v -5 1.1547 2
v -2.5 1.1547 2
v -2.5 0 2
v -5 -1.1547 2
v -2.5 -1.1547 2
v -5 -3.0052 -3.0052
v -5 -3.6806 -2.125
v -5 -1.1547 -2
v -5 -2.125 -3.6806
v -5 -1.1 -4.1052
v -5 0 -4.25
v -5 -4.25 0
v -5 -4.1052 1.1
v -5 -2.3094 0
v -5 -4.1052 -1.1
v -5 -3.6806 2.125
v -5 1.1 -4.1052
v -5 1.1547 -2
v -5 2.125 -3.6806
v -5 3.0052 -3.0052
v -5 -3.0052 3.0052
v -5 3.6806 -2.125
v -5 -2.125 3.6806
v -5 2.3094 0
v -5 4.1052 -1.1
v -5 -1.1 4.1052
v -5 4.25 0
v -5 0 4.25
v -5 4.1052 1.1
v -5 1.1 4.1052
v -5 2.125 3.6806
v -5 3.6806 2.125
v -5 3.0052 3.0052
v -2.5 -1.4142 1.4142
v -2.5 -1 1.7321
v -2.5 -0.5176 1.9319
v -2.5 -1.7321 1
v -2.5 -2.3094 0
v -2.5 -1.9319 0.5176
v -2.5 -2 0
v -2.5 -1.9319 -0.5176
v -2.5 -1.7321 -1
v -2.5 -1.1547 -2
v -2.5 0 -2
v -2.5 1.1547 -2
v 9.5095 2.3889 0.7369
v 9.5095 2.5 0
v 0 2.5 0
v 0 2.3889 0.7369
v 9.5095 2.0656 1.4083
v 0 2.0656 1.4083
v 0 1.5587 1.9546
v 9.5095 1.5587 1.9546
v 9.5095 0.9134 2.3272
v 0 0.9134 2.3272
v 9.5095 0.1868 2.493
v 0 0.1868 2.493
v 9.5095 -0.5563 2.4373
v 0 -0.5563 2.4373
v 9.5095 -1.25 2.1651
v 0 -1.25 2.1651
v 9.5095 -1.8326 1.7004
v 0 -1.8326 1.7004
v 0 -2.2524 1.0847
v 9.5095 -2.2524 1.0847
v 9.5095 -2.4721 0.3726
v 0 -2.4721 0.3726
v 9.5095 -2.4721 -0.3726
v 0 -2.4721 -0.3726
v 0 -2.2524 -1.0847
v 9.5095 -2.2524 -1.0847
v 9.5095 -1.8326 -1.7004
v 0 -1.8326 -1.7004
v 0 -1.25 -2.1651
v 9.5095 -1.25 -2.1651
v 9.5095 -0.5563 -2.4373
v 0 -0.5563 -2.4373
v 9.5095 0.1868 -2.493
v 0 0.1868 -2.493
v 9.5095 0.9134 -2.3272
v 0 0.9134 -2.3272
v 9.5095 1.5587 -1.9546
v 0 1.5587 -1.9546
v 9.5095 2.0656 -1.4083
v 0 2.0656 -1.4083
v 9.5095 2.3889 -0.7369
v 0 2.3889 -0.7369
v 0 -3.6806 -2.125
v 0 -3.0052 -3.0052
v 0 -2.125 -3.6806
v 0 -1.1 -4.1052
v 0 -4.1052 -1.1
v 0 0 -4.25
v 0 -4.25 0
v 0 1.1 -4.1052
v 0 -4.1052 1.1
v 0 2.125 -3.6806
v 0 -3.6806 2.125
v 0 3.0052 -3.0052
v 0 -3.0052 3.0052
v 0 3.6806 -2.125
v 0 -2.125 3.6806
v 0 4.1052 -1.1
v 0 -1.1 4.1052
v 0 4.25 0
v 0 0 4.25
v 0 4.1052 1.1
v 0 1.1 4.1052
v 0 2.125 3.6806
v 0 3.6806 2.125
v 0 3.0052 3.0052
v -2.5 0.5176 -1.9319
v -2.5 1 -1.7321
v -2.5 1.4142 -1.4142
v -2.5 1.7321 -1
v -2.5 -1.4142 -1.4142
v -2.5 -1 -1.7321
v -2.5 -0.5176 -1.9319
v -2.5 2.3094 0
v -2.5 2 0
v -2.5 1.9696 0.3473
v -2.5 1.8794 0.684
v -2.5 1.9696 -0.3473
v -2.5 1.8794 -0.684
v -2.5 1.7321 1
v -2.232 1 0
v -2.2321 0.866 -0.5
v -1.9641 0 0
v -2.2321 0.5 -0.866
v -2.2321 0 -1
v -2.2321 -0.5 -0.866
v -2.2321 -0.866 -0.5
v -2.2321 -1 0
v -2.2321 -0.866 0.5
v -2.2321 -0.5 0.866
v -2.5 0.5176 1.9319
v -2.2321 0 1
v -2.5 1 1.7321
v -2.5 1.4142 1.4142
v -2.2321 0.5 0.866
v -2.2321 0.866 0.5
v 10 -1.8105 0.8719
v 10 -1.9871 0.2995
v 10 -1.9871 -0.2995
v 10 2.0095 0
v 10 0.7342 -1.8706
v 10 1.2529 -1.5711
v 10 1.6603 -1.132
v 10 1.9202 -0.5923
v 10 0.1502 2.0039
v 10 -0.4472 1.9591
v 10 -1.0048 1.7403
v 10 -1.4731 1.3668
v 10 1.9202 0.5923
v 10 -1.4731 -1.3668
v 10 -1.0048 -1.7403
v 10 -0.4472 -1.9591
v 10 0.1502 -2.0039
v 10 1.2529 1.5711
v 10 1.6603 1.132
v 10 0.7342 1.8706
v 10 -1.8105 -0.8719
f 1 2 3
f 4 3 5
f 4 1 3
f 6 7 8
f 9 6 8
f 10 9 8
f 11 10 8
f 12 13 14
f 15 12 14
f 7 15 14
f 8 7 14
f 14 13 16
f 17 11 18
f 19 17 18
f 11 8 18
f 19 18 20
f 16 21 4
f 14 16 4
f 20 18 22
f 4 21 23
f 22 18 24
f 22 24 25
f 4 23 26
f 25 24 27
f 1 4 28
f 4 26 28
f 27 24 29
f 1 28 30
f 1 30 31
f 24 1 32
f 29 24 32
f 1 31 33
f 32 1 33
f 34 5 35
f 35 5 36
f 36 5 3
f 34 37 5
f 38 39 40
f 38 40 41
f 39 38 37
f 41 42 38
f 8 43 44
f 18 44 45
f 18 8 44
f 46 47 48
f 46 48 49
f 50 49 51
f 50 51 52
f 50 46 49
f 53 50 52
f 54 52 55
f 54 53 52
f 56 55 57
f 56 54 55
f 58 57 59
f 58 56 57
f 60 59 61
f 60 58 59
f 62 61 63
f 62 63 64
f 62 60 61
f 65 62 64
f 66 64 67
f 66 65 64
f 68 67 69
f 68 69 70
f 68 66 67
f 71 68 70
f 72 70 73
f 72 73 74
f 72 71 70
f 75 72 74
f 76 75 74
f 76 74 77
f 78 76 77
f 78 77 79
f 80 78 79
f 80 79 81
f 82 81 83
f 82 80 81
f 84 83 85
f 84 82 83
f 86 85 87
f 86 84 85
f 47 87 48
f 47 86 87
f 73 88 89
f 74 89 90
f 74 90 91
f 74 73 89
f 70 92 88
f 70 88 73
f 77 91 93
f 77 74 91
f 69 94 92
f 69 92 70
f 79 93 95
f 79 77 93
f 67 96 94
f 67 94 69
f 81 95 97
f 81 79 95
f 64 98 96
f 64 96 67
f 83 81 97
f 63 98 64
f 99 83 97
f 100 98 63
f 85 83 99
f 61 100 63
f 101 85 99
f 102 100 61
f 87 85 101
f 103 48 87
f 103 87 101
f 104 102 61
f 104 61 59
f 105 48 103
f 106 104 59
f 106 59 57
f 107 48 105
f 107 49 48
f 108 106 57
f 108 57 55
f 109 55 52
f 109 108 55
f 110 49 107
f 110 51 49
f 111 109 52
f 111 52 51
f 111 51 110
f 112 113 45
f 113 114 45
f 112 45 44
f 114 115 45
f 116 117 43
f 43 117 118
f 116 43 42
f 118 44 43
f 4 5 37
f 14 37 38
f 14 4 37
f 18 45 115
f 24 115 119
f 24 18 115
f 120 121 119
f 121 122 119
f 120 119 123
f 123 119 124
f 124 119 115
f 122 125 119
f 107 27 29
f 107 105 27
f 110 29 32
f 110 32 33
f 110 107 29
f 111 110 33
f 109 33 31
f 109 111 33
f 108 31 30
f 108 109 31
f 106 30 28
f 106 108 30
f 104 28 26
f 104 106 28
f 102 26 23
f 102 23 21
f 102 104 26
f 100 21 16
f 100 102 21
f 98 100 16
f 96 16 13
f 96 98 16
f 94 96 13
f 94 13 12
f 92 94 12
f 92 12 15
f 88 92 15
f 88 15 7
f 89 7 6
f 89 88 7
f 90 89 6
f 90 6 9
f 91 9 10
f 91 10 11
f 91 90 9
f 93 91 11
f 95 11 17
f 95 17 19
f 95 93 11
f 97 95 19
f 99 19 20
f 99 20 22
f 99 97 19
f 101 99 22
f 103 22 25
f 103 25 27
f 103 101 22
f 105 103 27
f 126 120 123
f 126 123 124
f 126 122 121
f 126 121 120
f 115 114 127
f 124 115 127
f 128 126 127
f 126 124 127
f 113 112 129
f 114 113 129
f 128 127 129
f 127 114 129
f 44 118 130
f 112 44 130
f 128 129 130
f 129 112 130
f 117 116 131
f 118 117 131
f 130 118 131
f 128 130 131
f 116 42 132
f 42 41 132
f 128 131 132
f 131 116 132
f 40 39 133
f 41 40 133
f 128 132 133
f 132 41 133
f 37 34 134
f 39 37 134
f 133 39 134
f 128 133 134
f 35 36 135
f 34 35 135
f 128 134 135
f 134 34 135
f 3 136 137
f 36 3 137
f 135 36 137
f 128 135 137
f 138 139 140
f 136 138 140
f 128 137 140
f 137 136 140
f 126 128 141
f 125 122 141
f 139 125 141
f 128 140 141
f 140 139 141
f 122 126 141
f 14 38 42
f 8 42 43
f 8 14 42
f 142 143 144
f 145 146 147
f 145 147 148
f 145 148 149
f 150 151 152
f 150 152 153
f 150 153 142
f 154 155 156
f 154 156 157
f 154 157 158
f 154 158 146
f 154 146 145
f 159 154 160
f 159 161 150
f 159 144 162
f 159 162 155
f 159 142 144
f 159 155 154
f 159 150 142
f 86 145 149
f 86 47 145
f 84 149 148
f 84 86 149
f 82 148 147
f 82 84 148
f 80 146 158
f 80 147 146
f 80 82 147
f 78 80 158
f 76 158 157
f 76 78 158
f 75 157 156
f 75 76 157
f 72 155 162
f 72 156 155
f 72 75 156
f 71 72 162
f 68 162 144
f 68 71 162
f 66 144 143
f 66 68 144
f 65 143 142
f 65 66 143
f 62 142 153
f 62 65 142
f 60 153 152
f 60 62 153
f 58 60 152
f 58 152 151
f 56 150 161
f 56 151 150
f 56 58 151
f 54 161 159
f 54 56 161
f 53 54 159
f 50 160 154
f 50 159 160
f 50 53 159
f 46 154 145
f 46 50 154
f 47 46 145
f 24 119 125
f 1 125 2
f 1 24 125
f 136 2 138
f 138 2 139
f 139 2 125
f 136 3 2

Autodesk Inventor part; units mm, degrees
sketch "Sketch_1" plane through (0, 0, 0) normal (0, 0, 1) x (1, 0, 0)
  line L0 (10, 0) -> (-5, 0)
  line L1 (-5, 0) -> (-5, 4.25)
  line L2 (-5, 4.25) -> (0, 4.25)
  line L3 (0, 4.25) -> (0, 2.5)
  line L4 (0, 2.5) -> (9.5095, 2.5)
  line L5 (9.5095, 2.5) -> (10, 2.0095)
  line L6 (10, 2.0095) -> (10, 0)
  line L7 (10, 0) -> (-5, 0)
revolve "Revolution1" add sketch "Sketch_1" angle 360 about axis through (10, 0, 0) along (1, 0, 0)
thread "Thread1" size "M5x0.8" class "6g" standard "ISO Metric profile" length 9.5 offset 0.5
sketch "Sketch_4" plane through (0, 0, 0) normal (0, 0, 1) x (1, 0, 0)
  line L0 (-1.9641, 0) -> (-5, 0)
  line L1 (-5, 0) -> (-5, 2)
  line L2 (-5, 2) -> (-2.5, 2)
  line L3 (-2.5, 2) -> (-1.9641, 0)
  line L4 (-1.9641, 0) -> (-5, 0)
revolve "Revolution2" cut sketch "Sketch_4" angle 360 about axis through (-1.9641, 0, 0) along (1, 0, 0)
sketch "Sketch_3" plane through (-5, 0, 0) normal (1, 0, 0) x (0, 0, -1)
  line L0 (-2, 1.1547) -> (-2, -1.1547)
  line L1 (-2, -1.1547) -> (0, -2.3094)
  line L2 (0, -2.3094) -> (2, -1.1547)
  line L3 (2, -1.1547) -> (2, 1.1547)
  line L4 (2, 1.1547) -> (0, 2.3094)
  line L5 (0, 2.3094) -> (-2, 1.1547)
extrude "Extrusion1" cut sketch "Sketch_3" along normal blind 2.5
ref_plane "bolt_XY" through (0, 0, 0) normal (1, 0, 0) x (0, 0, -1)
ref_plane "bolt_YZ" through (0, 0, 0) normal (0, 0, -1) x (0, 1, 0)
ref_plane "bolt_ZX" through (0, 0, 0) normal (0, 1, 0) x (1, 0, 0)
ref_plane "nut_XY" through (10, 0, 0) normal (1, 0, 0) x (0, 0, -1)
ref_plane "nut_YZ" through (10, 0, 0) normal (0, 0, -1) x (0, 1, 0)
ref_plane "nut_ZX" through (10, 0, 0) normal (0, 1, 0) x (1, 0, 0)
properties part number "CBM5-10" material "MISUMI"
